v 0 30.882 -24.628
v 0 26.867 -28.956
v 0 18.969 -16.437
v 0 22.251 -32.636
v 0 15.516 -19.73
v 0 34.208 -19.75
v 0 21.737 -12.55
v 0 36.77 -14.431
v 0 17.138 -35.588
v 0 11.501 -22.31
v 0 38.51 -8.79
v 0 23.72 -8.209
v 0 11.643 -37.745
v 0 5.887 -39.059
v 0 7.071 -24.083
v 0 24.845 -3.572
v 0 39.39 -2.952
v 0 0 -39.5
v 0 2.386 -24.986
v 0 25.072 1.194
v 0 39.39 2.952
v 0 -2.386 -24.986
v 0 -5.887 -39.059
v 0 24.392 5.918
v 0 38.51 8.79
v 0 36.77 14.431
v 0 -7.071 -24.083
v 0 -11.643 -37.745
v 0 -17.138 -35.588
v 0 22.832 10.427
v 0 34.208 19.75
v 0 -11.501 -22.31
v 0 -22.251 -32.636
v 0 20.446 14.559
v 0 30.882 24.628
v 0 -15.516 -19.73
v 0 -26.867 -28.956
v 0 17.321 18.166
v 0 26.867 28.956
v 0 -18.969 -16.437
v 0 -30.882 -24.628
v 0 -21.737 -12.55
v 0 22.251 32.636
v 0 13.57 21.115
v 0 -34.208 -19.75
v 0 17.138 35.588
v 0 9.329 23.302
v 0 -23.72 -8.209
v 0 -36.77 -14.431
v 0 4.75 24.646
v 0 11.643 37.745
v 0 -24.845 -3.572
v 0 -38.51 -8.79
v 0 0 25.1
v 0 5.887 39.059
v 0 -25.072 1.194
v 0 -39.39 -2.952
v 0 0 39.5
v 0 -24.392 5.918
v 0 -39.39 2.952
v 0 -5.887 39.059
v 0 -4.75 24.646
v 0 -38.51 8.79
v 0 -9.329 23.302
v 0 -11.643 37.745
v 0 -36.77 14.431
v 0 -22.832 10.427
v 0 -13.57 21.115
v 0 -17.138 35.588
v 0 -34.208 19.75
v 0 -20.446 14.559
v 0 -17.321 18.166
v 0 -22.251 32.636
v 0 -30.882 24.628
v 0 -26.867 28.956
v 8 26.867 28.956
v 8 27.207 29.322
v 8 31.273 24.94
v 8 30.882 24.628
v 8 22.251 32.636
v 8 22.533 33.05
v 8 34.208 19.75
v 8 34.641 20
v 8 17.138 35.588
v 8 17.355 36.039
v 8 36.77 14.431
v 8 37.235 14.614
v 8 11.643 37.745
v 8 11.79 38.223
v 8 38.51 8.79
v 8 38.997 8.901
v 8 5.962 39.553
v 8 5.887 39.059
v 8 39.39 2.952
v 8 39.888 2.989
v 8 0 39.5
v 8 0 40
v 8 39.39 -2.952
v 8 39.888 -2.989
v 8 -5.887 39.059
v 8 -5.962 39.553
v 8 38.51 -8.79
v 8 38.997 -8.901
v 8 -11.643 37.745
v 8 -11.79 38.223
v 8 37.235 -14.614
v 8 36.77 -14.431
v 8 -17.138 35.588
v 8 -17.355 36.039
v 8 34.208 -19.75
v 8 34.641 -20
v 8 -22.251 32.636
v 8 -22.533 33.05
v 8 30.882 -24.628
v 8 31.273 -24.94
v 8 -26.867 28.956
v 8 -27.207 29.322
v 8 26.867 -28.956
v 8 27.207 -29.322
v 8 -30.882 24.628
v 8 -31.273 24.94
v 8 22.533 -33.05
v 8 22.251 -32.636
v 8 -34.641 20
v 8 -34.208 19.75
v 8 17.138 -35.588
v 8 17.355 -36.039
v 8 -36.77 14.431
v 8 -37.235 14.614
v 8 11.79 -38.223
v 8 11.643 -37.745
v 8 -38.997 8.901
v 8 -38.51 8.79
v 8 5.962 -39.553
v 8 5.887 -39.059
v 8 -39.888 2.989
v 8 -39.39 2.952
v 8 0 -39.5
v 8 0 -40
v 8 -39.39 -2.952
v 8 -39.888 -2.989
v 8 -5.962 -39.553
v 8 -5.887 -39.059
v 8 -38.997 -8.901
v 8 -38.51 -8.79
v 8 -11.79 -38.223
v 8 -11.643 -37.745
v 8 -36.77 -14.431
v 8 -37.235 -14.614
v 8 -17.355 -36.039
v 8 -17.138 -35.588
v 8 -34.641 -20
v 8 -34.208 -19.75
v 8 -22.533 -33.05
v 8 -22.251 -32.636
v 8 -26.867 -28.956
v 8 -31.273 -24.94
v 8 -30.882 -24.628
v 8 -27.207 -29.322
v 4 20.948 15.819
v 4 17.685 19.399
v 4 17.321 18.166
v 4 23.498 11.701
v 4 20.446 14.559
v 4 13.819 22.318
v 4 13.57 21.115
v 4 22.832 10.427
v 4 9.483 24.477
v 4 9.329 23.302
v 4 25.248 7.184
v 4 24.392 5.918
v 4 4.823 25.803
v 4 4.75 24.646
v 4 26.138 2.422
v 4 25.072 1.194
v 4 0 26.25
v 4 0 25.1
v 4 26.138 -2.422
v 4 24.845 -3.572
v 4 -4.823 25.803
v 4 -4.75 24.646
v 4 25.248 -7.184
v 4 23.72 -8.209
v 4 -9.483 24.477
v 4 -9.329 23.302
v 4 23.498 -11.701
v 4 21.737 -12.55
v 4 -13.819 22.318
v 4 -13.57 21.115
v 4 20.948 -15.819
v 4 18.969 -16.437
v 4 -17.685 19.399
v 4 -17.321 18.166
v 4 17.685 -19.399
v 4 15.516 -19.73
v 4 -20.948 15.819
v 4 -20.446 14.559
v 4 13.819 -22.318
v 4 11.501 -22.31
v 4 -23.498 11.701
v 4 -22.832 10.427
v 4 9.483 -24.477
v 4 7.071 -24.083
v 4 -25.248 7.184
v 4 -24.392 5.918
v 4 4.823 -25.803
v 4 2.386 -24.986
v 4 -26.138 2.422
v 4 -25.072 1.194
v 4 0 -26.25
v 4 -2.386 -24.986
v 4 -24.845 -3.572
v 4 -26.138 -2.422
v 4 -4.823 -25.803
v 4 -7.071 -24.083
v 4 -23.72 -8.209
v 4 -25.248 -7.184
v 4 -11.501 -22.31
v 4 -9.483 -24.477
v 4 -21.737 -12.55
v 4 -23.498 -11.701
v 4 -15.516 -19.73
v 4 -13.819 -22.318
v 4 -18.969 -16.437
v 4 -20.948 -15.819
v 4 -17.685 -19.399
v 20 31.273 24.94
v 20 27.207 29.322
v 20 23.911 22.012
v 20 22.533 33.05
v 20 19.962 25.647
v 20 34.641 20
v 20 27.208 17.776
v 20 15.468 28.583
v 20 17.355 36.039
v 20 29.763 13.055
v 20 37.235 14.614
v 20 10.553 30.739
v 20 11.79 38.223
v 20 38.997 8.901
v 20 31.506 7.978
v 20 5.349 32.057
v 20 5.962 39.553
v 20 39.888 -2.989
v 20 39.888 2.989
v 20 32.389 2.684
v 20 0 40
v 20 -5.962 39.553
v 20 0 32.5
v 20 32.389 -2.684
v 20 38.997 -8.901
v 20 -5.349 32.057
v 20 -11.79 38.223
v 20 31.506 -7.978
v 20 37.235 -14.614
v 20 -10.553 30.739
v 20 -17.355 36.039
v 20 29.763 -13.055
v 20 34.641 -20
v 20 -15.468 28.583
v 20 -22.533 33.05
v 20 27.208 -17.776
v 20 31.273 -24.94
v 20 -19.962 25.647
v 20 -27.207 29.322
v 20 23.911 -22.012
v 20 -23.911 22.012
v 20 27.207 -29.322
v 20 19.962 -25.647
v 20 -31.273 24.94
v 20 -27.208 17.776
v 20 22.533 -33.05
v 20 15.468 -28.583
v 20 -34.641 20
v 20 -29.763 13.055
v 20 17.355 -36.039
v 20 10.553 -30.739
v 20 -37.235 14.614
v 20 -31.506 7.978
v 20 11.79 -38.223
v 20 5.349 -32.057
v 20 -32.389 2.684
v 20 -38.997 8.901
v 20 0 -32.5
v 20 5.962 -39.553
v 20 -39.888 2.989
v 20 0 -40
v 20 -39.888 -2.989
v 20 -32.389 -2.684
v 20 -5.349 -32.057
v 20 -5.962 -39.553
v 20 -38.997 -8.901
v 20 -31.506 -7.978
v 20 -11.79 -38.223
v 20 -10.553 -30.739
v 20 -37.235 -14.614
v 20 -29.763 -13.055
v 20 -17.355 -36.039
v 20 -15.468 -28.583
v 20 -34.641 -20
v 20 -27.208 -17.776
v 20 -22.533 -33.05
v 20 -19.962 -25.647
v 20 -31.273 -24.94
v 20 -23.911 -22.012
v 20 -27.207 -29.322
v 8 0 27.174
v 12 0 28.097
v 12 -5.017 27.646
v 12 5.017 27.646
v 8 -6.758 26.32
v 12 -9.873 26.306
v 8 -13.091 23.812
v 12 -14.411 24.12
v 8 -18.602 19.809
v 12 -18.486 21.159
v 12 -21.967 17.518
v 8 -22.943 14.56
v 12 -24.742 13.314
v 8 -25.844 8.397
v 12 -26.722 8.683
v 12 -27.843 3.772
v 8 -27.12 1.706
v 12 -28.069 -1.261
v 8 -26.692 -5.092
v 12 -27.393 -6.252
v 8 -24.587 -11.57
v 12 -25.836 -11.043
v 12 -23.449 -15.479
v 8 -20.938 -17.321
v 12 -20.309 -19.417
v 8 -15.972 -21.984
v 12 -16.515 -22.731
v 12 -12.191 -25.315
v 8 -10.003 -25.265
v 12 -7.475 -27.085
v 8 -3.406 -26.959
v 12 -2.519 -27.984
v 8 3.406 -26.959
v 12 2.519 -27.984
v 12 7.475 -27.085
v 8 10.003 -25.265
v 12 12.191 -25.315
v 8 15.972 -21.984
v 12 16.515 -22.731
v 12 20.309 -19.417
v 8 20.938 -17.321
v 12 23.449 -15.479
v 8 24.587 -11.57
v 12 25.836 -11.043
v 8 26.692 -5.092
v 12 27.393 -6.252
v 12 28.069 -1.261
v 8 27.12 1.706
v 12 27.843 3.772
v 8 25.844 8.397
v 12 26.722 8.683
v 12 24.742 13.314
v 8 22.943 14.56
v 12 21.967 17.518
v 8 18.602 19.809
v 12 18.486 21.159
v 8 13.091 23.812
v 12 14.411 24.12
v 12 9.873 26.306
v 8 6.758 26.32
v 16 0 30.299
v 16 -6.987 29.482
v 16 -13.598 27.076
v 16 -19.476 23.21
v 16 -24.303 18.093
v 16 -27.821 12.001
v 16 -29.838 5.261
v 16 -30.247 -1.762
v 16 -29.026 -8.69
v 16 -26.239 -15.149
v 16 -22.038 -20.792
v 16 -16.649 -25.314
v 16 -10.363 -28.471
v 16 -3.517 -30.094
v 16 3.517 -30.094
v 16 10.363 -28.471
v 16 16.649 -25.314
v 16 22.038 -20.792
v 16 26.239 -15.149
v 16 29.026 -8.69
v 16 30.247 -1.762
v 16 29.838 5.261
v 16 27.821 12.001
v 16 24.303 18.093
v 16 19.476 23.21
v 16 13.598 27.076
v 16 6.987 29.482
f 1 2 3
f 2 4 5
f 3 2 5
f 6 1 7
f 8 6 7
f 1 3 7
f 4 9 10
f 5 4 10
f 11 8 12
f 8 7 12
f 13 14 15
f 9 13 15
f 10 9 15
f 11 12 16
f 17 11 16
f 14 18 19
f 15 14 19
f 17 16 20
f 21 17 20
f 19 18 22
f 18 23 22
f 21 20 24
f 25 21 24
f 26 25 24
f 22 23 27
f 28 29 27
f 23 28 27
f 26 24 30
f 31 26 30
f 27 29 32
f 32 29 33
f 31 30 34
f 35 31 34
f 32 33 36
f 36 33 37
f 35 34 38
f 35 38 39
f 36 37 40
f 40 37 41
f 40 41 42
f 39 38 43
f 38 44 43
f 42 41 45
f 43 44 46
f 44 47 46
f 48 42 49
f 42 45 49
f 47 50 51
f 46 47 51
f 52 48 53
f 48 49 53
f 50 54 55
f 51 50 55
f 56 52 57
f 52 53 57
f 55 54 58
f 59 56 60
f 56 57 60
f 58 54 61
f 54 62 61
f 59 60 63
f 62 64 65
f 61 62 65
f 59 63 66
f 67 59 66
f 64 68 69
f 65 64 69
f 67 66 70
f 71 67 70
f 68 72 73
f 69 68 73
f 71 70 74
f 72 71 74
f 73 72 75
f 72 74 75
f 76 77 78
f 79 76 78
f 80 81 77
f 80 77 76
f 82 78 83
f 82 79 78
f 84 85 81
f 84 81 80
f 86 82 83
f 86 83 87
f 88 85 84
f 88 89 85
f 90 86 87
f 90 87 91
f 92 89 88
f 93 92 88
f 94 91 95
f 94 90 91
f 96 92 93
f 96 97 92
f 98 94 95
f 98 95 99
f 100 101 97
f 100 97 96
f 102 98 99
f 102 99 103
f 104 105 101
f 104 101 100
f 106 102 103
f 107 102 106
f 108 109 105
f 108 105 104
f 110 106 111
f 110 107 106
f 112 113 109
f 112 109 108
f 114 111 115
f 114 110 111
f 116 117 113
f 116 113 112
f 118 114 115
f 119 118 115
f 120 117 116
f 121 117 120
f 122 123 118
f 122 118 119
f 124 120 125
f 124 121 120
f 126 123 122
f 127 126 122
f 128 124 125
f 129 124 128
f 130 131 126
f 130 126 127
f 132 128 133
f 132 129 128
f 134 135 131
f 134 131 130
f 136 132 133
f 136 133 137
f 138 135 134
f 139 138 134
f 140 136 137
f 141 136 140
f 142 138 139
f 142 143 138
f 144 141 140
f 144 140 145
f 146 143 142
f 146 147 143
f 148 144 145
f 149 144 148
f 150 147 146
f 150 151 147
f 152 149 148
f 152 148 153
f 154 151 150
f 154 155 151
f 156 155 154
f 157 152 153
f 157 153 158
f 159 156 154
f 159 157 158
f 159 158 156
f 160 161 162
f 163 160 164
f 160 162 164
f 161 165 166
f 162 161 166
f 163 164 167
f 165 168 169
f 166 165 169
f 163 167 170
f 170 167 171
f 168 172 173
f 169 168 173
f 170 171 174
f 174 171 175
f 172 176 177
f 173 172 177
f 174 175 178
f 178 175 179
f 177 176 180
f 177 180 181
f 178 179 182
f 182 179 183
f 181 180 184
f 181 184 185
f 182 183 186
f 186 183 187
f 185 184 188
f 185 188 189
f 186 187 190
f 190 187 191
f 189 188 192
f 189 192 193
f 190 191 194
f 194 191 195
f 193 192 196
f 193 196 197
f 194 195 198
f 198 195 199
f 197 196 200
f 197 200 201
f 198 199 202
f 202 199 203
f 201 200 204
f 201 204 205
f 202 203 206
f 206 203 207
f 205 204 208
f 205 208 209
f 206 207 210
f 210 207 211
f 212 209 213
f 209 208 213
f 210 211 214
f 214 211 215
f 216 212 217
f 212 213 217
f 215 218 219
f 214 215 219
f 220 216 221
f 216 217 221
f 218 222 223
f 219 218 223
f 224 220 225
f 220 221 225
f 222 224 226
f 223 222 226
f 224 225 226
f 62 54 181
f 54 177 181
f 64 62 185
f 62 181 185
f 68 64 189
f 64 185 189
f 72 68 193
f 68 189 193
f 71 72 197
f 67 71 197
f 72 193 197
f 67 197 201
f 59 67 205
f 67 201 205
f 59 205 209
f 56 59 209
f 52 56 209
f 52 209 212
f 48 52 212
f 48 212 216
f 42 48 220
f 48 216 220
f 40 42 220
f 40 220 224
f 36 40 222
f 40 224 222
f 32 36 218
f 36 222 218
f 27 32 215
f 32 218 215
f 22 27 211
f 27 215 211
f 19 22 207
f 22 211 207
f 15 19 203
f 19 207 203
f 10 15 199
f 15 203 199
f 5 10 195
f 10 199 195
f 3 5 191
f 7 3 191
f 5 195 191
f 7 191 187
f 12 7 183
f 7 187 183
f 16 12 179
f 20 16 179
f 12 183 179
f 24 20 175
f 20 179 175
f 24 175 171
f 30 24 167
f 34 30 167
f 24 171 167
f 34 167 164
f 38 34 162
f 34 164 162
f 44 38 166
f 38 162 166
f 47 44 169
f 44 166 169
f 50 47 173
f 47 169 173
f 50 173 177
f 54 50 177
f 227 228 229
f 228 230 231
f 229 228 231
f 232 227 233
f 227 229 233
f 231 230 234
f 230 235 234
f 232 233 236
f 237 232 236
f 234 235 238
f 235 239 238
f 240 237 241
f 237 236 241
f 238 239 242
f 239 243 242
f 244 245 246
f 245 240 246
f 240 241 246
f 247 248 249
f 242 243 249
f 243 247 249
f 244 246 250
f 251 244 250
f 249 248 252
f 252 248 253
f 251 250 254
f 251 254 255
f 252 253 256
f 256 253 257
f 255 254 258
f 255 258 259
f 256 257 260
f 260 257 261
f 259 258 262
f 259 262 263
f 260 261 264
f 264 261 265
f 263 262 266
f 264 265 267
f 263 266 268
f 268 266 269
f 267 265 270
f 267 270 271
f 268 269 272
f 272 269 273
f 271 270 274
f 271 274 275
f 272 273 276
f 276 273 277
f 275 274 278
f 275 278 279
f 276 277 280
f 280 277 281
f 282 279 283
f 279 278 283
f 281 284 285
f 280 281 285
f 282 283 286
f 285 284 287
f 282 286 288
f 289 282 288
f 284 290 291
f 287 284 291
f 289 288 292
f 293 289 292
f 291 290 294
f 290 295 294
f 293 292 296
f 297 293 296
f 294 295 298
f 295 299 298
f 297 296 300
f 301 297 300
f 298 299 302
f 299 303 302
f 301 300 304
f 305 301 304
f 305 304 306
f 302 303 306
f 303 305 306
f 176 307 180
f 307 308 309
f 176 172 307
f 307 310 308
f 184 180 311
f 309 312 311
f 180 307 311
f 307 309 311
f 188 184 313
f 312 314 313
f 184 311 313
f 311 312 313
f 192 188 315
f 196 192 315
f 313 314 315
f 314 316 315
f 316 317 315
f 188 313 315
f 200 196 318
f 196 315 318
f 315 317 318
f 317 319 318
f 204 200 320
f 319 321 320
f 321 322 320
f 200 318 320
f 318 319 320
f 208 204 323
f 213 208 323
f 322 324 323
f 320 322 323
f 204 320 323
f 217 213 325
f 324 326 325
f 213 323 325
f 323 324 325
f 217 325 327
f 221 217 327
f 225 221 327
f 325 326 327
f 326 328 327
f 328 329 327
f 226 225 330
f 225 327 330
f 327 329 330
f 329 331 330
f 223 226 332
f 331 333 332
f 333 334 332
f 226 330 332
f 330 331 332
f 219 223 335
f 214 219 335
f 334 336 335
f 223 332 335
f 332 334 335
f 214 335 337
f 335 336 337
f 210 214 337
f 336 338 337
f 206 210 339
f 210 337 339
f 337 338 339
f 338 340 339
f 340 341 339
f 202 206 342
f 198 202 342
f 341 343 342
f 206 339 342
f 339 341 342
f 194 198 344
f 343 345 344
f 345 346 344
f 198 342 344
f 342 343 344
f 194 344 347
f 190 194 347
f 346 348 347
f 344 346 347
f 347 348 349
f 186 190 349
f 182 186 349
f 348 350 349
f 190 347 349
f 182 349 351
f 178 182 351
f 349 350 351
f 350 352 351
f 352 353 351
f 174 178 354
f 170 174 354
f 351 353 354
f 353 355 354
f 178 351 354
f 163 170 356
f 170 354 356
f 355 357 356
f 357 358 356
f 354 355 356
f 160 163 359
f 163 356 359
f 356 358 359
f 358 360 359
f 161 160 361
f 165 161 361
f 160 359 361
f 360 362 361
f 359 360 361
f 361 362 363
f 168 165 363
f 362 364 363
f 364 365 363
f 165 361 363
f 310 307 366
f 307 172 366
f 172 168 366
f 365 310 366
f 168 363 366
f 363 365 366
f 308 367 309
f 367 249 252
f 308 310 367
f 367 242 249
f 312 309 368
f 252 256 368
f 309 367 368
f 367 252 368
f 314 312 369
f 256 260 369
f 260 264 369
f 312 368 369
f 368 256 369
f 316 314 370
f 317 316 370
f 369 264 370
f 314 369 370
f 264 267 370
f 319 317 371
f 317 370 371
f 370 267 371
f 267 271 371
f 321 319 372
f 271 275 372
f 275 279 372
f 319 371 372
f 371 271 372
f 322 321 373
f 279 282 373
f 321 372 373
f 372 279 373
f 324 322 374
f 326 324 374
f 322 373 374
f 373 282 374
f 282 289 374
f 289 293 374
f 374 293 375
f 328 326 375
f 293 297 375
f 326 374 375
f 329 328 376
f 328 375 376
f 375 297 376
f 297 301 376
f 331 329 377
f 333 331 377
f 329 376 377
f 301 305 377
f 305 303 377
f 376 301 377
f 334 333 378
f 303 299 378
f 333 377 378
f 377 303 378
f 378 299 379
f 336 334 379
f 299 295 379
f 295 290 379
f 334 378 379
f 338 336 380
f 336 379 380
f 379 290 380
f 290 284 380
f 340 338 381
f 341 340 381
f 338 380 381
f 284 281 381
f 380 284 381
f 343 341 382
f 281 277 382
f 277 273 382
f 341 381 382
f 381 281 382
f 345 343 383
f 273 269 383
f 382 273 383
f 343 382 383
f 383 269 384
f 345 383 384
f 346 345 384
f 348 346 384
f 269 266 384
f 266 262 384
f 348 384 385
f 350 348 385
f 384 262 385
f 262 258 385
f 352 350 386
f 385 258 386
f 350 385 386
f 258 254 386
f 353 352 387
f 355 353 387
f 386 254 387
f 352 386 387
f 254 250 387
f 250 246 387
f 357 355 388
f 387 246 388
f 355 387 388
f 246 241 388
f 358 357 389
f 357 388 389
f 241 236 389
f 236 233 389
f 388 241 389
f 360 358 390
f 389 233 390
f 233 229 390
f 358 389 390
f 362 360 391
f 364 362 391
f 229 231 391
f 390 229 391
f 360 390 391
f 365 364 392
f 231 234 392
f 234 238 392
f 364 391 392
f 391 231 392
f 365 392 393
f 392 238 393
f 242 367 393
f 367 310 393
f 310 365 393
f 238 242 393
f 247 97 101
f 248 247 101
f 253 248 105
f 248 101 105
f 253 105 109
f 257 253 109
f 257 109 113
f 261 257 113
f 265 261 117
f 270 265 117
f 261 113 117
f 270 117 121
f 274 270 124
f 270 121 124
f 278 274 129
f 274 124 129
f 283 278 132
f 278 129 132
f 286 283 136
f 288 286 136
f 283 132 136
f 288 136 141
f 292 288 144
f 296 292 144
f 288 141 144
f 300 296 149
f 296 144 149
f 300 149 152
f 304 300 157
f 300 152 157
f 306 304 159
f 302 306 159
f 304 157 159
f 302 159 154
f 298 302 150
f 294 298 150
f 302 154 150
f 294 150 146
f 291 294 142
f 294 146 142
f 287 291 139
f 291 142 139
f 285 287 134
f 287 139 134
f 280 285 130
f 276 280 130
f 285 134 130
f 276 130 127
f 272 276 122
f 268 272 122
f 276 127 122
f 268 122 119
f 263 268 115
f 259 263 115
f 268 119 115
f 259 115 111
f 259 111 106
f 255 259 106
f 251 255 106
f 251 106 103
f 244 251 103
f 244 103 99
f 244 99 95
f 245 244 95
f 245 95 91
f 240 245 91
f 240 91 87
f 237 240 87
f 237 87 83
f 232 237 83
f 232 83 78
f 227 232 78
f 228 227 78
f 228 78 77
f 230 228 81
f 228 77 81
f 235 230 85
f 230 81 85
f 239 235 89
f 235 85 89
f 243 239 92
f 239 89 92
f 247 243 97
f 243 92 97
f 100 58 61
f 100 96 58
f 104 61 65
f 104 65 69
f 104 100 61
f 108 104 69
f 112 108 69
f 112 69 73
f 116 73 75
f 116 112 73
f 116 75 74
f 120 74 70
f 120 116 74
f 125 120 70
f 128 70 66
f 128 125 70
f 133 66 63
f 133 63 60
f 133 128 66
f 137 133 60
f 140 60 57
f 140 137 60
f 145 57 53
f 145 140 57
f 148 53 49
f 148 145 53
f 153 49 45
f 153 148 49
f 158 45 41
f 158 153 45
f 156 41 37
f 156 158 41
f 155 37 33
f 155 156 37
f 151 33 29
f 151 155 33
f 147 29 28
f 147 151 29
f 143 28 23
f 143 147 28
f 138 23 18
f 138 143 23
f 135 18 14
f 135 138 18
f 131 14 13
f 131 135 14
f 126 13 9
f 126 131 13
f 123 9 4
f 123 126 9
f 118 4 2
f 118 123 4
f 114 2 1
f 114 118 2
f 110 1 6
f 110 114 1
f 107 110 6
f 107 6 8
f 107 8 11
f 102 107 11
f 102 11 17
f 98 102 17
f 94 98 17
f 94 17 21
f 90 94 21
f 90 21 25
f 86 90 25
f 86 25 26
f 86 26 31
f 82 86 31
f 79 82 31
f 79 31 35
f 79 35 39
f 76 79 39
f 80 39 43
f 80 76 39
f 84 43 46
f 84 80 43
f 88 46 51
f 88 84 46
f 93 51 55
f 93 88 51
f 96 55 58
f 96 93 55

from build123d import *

# Parameters (mm, degrees)
F2_W = 8
F2_H = 0.5


with BuildPart() as f1:
    # F0 (on Front) → F1 (revolve)
    with BuildSketch(Plane.XZ):
        Polygon((20, 40), (0, 40), (0, 25.1), (4, 25.1), (4, 26.25), (12, 28.0972), (20, 32.5), align=None)
    revolve(axis=Axis((11.28888, 0, 0), (1, 0, 0)))

    # F2 (on Front) → F3 (revolve, cut)
    with BuildSketch(Plane.XZ):
        with Locations((4, 39.75)):
            Rectangle(F2_W, F2_H)
    revolve(axis=Axis((17.787712, 0, 0), (1, 0, 0)), mode=Mode.SUBTRACT)


solid = f1.part
